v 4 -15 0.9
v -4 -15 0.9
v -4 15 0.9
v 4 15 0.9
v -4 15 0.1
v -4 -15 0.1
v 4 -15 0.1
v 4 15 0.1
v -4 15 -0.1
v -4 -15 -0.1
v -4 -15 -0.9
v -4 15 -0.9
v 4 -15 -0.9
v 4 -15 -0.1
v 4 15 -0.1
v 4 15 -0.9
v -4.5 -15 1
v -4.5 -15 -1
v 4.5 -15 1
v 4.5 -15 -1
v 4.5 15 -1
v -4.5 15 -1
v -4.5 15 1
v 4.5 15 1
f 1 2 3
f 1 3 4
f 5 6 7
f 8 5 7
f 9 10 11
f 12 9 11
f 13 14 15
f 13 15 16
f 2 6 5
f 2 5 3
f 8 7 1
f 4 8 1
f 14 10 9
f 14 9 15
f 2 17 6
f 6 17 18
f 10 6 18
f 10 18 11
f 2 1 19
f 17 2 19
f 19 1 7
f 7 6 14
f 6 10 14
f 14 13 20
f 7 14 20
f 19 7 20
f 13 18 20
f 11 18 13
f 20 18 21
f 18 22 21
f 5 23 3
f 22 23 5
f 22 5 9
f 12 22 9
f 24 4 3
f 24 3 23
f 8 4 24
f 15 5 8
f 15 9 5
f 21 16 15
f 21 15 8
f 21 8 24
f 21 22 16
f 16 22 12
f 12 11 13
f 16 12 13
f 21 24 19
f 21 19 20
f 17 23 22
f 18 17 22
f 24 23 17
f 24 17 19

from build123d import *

# Parameters (mm, degrees)
SKETCH1_W           = 9
SKETCH1_H           = 2
BOSS_EXTRUDE1_DEPTH = 15
CUT_EXTRUDE1_START  = -31
SKETCH2_W           = 8
SKETCH2_H           = 0.8
CUT_EXTRUDE1_DEPTH  = 32


with BuildPart() as part:
    # Sketch1 → Boss-Extrude1 (new body, symmetric)
    with BuildSketch(Plane(origin=(0, 0, 0), x_dir=(1, 0, 0), z_dir=(0, 1, 0))):
        Rectangle(SKETCH1_W, SKETCH1_H)
    extrude(amount=BOSS_EXTRUDE1_DEPTH, both=True)

    # Sketch2 → Cut-Extrude1 (cut)
    with BuildSketch(Plane(origin=(0, 15, 0), x_dir=(1, 0, 0), z_dir=(0, 1, 0)).offset(CUT_EXTRUDE1_START)):
        with Locations((0, 0.5)):
            Rectangle(SKETCH2_W, SKETCH2_H)
    cut_extrude1 = extrude(amount=CUT_EXTRUDE1_DEPTH, mode=Mode.SUBTRACT)

    # Mirror1: Cut-Extrude1 across plane
    add(cut_extrude1.mirror(Plane.XY), mode=Mode.SUBTRACT)


solid = part.part
